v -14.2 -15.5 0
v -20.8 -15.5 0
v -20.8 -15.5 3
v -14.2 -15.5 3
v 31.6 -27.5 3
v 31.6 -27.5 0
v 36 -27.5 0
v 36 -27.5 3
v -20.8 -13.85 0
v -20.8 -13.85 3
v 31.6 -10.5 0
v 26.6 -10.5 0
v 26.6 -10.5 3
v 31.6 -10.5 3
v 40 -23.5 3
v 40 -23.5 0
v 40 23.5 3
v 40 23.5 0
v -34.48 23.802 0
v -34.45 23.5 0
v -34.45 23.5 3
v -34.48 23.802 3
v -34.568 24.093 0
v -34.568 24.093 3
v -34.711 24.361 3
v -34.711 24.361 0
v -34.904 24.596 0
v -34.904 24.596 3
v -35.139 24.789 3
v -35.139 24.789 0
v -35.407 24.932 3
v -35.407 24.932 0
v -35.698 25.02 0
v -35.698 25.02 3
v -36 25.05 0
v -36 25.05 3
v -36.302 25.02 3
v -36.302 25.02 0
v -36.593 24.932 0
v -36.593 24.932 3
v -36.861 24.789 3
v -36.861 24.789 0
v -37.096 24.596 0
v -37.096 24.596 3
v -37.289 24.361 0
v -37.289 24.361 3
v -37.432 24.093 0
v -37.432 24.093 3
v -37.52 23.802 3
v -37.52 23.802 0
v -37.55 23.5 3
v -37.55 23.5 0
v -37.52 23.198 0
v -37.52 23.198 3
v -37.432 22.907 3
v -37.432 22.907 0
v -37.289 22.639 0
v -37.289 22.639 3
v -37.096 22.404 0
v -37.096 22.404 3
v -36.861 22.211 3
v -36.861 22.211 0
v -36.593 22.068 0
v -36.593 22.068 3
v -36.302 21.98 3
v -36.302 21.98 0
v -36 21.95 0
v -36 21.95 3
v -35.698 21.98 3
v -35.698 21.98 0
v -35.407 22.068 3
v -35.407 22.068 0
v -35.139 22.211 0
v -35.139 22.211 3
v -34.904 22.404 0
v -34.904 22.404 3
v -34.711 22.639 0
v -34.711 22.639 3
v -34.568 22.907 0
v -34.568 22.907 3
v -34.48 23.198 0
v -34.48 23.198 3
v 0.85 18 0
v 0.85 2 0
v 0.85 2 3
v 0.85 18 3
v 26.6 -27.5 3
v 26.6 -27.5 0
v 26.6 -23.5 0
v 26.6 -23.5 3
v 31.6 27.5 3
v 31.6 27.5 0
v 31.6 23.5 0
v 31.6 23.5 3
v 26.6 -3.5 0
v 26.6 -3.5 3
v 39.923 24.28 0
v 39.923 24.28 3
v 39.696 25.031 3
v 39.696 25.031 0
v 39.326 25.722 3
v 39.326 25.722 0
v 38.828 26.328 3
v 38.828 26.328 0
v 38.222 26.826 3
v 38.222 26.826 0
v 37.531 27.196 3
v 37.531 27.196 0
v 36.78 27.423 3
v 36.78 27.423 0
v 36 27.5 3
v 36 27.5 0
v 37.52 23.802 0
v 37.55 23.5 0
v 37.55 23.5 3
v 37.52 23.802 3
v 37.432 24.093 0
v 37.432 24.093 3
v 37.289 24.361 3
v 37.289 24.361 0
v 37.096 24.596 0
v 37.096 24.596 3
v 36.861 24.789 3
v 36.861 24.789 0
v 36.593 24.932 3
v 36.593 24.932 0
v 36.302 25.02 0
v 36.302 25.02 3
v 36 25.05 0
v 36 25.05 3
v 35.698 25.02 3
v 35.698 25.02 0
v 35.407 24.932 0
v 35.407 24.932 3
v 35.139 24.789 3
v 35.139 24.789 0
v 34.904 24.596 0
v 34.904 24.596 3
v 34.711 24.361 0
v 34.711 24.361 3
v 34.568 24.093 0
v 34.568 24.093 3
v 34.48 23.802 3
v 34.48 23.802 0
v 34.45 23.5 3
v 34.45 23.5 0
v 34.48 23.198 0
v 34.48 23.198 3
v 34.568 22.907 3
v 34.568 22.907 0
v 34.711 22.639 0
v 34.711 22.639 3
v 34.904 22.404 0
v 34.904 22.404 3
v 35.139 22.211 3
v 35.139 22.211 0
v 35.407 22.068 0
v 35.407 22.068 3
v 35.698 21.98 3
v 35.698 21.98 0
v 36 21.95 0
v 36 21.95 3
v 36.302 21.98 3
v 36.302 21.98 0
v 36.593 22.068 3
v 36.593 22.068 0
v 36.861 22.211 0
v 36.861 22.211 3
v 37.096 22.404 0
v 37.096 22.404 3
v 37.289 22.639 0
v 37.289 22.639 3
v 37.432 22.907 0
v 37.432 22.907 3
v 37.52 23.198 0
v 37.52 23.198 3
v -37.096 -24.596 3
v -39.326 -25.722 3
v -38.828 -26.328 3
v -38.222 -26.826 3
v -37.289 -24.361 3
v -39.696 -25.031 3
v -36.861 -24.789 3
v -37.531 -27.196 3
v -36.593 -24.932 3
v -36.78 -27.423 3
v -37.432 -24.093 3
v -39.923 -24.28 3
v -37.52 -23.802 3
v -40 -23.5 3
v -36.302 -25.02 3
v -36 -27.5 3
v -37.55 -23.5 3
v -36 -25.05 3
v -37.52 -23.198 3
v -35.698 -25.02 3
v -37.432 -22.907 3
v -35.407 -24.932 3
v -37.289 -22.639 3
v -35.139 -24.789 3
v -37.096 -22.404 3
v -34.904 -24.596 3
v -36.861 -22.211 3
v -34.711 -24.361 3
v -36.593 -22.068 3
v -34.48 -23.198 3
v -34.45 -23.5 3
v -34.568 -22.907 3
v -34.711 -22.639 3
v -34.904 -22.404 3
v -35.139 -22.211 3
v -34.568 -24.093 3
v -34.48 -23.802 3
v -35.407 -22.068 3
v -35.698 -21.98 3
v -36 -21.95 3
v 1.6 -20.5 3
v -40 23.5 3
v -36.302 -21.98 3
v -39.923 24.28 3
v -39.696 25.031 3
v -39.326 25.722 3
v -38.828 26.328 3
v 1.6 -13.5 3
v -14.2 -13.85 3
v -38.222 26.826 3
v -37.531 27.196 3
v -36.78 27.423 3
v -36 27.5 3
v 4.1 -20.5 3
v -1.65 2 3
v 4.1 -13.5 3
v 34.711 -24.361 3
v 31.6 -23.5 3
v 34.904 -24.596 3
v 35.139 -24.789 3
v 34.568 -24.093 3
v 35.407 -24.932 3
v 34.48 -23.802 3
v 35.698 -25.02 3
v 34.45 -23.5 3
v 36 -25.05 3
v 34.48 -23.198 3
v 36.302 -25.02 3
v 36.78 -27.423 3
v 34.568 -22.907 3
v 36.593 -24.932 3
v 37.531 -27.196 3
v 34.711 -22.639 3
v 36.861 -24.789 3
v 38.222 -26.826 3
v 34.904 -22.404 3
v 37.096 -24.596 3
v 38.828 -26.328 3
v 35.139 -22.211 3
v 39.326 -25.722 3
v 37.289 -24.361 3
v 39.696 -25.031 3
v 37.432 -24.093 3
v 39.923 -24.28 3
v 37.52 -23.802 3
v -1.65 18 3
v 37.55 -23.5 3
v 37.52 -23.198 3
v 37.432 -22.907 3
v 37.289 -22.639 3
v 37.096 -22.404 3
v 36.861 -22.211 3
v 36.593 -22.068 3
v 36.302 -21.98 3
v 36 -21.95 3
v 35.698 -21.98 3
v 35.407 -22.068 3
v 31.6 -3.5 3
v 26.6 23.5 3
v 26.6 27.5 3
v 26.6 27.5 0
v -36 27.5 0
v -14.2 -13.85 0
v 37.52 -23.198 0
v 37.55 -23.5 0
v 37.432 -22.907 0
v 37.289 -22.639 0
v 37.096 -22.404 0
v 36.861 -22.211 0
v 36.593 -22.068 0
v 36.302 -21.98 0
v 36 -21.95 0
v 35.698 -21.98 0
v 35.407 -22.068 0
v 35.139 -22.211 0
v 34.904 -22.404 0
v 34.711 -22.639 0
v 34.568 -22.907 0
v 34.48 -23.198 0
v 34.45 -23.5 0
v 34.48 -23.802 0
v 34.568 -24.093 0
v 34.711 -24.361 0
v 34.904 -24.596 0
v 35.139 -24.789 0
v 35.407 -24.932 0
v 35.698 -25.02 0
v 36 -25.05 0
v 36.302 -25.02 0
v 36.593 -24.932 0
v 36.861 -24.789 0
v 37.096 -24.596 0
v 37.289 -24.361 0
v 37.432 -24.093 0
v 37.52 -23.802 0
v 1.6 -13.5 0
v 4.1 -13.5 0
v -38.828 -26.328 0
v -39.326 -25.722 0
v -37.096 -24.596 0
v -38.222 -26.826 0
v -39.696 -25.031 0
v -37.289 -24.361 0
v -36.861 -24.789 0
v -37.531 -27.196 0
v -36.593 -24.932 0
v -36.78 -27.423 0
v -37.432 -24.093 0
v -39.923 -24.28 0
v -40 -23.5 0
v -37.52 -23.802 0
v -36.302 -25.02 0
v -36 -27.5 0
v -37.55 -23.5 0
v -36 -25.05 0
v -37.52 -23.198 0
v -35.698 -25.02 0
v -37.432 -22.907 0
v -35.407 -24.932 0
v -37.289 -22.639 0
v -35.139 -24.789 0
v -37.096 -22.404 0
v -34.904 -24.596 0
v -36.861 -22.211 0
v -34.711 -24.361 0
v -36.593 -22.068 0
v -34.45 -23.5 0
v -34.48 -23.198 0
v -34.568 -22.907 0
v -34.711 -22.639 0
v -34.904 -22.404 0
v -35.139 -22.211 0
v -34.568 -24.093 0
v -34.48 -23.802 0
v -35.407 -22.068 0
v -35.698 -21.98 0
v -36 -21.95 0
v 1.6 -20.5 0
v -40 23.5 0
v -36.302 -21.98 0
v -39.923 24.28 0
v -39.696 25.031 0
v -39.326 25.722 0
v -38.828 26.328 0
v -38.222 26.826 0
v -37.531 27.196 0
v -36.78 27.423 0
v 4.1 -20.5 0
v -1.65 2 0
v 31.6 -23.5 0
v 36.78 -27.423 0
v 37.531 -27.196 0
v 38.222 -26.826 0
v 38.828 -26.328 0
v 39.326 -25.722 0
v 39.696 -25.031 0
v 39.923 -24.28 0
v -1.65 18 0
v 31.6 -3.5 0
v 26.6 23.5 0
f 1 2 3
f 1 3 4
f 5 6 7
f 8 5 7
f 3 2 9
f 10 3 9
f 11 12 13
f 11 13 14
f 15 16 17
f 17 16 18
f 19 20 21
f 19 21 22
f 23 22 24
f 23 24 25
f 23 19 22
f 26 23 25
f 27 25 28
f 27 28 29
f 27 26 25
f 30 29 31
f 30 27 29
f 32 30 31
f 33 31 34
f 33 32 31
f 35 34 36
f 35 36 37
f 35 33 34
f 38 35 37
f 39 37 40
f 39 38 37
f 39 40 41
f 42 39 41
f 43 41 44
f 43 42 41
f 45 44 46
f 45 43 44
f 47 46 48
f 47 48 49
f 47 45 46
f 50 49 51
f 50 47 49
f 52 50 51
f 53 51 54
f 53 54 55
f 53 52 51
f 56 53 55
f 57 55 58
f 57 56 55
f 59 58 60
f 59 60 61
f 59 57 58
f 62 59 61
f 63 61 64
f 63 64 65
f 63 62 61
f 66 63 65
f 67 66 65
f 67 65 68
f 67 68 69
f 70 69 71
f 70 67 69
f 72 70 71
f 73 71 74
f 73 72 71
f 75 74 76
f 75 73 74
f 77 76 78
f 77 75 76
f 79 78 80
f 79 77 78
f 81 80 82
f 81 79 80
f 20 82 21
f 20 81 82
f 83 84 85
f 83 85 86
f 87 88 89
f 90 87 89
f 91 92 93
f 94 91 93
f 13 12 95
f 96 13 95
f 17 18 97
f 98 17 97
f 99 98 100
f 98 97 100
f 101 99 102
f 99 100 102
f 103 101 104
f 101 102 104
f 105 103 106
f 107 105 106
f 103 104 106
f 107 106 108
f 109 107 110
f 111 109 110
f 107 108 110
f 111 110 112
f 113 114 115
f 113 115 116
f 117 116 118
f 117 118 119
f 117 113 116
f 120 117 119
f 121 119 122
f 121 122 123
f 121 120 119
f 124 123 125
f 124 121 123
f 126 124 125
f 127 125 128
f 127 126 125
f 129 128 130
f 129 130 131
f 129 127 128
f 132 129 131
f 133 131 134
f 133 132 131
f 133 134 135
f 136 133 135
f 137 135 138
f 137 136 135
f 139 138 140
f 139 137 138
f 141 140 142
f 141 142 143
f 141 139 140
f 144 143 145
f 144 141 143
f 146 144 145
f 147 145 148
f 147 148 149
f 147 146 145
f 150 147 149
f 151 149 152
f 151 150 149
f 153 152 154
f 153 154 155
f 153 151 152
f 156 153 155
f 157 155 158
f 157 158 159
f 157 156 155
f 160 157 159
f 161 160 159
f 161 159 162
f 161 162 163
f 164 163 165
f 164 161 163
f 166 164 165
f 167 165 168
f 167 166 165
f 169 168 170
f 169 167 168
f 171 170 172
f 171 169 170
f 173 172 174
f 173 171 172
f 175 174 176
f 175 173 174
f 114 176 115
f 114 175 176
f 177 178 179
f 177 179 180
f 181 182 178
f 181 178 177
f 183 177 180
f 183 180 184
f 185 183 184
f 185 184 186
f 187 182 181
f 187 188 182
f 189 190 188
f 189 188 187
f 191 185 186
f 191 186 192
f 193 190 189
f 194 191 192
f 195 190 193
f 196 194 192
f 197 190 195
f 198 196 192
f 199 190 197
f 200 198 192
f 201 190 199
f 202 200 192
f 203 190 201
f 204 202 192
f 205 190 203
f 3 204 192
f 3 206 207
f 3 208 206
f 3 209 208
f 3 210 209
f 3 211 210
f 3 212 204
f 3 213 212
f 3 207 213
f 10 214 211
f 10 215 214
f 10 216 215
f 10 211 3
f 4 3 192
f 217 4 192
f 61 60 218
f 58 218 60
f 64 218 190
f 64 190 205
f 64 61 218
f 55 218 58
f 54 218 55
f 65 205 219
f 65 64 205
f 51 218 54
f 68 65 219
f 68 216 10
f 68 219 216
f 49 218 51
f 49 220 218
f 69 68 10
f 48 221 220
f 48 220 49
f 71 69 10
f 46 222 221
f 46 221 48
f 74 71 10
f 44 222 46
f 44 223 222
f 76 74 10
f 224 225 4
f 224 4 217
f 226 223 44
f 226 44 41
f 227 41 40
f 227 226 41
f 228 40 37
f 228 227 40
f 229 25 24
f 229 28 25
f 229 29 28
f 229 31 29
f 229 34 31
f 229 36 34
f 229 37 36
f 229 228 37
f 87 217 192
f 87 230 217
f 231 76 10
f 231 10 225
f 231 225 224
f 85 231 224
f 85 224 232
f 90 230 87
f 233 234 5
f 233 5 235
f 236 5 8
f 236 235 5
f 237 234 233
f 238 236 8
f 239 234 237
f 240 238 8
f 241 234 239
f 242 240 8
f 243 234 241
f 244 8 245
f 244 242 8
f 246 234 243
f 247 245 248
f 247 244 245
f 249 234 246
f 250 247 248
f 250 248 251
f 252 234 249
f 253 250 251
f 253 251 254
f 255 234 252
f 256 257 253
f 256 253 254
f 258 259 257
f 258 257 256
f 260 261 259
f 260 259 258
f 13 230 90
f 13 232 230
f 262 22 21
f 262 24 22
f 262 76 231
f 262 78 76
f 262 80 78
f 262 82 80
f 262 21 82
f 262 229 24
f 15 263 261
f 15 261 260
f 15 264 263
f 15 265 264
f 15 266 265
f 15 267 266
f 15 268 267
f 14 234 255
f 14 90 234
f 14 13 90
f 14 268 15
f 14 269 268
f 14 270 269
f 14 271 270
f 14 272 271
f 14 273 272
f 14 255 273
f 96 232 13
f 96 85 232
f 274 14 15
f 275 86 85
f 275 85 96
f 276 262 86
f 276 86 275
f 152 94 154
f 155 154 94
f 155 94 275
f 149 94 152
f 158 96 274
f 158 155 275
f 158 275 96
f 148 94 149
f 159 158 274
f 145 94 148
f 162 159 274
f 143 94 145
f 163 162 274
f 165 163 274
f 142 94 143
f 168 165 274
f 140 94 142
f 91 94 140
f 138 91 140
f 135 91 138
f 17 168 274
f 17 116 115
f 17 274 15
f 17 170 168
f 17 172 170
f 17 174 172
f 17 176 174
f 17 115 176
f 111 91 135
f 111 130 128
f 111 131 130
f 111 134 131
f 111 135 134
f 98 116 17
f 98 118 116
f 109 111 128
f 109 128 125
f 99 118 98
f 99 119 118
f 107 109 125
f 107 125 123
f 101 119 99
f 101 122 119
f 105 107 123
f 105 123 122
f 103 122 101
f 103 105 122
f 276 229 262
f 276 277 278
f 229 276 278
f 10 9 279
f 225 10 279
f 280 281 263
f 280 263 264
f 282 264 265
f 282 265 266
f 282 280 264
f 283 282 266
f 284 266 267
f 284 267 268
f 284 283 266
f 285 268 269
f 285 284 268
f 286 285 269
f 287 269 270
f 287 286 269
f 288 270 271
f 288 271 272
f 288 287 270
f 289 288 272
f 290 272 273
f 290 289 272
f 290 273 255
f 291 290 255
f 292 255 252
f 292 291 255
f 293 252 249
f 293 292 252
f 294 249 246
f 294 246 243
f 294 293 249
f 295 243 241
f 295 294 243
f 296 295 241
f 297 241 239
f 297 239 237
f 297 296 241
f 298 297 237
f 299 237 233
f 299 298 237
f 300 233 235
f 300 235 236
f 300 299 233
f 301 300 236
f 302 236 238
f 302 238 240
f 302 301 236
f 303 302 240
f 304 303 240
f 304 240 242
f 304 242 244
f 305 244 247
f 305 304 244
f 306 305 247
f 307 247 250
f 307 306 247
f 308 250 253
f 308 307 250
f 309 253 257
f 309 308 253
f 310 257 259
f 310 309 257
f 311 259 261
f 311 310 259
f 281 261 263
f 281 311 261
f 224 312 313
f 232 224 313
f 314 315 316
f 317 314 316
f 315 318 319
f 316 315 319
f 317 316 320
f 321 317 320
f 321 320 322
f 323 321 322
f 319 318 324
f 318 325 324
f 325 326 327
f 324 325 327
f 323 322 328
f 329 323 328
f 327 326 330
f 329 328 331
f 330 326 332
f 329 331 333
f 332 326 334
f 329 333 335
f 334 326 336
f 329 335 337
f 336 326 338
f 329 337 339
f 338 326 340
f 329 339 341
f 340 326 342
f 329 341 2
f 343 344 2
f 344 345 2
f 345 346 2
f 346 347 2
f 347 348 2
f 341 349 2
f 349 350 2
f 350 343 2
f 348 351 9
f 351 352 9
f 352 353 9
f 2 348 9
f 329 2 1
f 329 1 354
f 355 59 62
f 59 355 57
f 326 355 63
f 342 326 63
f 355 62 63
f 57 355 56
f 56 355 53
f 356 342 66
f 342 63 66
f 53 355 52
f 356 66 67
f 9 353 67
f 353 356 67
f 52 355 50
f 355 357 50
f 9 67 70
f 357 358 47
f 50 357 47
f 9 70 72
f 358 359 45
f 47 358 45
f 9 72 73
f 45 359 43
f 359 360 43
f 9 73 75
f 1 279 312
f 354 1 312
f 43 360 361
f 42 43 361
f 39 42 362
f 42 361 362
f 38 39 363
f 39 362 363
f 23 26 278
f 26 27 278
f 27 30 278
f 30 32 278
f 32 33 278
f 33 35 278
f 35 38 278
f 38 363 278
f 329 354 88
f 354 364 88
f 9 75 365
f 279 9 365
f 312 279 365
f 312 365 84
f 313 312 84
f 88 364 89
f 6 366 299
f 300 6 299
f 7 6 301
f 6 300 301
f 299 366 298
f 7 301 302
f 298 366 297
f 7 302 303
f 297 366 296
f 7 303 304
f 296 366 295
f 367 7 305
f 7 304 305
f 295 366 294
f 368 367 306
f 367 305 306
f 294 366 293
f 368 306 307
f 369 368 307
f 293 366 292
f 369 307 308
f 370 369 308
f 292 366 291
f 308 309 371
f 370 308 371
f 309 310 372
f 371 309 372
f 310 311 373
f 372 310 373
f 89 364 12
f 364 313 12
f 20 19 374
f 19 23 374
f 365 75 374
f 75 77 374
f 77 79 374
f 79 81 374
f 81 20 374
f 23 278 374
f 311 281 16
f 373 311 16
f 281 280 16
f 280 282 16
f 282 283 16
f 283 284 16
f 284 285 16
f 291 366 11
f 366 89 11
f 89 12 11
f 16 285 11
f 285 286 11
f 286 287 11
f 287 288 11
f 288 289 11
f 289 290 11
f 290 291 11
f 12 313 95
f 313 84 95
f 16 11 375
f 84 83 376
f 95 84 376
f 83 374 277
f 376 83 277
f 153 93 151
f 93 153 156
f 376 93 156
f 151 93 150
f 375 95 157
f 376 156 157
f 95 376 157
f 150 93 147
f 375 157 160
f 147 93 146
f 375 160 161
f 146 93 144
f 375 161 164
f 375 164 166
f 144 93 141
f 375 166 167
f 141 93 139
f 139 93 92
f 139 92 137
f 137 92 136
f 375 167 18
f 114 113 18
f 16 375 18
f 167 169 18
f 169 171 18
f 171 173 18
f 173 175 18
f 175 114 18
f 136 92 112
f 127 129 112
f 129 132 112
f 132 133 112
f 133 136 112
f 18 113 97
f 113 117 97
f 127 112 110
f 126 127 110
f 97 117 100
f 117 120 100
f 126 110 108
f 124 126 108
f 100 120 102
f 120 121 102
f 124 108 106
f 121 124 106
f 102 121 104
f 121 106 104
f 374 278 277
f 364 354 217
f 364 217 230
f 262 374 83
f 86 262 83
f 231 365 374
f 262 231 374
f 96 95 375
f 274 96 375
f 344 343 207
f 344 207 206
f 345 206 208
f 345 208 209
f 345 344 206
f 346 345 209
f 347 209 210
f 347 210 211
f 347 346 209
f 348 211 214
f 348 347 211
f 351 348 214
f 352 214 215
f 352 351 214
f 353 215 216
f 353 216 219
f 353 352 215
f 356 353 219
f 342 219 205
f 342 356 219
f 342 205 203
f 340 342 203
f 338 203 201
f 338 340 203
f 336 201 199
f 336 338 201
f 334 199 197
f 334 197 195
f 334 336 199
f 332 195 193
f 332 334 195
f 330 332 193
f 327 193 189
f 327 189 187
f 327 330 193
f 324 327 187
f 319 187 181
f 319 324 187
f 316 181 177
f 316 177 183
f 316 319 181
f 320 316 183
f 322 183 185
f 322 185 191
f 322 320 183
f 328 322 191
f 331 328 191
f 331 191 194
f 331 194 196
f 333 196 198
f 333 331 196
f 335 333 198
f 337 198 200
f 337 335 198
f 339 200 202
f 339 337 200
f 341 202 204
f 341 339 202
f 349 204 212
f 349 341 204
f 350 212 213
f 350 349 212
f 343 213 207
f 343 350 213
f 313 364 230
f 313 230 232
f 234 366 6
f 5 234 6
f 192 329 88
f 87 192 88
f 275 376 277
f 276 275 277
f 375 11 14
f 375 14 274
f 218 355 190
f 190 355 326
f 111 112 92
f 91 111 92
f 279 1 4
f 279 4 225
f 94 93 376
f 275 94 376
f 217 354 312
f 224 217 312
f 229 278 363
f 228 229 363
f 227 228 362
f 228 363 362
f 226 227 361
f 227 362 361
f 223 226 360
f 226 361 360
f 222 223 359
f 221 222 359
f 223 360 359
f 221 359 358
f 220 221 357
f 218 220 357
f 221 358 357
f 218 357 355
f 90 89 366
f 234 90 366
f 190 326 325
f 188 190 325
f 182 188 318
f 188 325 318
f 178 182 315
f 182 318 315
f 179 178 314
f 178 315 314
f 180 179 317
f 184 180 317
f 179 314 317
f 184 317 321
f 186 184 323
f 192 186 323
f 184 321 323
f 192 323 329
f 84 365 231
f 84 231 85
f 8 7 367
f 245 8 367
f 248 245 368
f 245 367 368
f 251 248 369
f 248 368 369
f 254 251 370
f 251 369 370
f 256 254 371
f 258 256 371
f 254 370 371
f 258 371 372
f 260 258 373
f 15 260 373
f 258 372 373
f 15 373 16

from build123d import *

# Parameters (mm, degrees)
ESQUISSE1_R        = 1.55
ESQUISSE1_W        = 5
ESQUISSE1_H        = 7
ESQUISSE1_W_2      = 2.5
ESQUISSE1_H_2      = 16
ESQUISSE1_W_3      = 6.6
ESQUISSE1_H_3      = 1.65
BOSS_EXTRU_1_DEPTH = 3


with BuildPart() as part:
    # Esquisse1 → Boss.-Extru.1 (new body)
    with BuildSketch(Plane.XY):
        with BuildLine():
            Line((26.6, 27.5), (-36, 27.5))
            ThreePointArc((-36, 27.5), (-38.828427125, 26.328427125), (-40, 23.5))
            Line((-40, 23.5), (-40, -23.5))
            ThreePointArc((-40, -23.5), (-38.828427125, -26.328427125), (-36, -27.5))
            Line((-36, -27.5), (26.6, -27.5))
            Line((26.6, -27.5), (26.6, -23.5))
            Line((26.6, -23.5), (31.6, -23.5))
            Line((31.6, -23.5), (31.6, -27.5))
            Line((31.6, -27.5), (36, -27.5))
            ThreePointArc((36, -27.5), (38.828427125, -26.328427125), (40, -23.5))
            Line((40, -23.5), (40, 23.5))
            ThreePointArc((40, 23.5), (38.828427125, 26.328427125), (36, 27.5))
            Line((36, 27.5), (31.6, 27.5))
            Line((31.6, 27.5), (31.6, 23.5))
            Line((31.6, 23.5), (26.6, 23.5))
            Line((26.6, 23.5), (26.6, 27.5))
        make_face()
        with Locations((-36, -23.5)):
            Circle(ESQUISSE1_R, mode=Mode.SUBTRACT)
        with Locations((-36, 23.5)):
            Circle(ESQUISSE1_R, mode=Mode.SUBTRACT)
        with Locations((36, 23.5)):
            Circle(ESQUISSE1_R, mode=Mode.SUBTRACT)
        with Locations((36, -23.5)):
            Circle(ESQUISSE1_R, mode=Mode.SUBTRACT)
        with Locations((29.1, -7)):
            Rectangle(ESQUISSE1_W, ESQUISSE1_H, mode=Mode.SUBTRACT)
        with Locations((-0.4, 10)):
            Rectangle(ESQUISSE1_W_2, ESQUISSE1_H_2, mode=Mode.SUBTRACT)
        with Locations((-17.5, -14.675)):
            Rectangle(ESQUISSE1_W_3, ESQUISSE1_H_3, mode=Mode.SUBTRACT)
        with Locations((2.85, -17)):
            Rectangle(ESQUISSE1_W_2, ESQUISSE1_H, mode=Mode.SUBTRACT)
    extrude(amount=BOSS_EXTRU_1_DEPTH)


solid = part.part
